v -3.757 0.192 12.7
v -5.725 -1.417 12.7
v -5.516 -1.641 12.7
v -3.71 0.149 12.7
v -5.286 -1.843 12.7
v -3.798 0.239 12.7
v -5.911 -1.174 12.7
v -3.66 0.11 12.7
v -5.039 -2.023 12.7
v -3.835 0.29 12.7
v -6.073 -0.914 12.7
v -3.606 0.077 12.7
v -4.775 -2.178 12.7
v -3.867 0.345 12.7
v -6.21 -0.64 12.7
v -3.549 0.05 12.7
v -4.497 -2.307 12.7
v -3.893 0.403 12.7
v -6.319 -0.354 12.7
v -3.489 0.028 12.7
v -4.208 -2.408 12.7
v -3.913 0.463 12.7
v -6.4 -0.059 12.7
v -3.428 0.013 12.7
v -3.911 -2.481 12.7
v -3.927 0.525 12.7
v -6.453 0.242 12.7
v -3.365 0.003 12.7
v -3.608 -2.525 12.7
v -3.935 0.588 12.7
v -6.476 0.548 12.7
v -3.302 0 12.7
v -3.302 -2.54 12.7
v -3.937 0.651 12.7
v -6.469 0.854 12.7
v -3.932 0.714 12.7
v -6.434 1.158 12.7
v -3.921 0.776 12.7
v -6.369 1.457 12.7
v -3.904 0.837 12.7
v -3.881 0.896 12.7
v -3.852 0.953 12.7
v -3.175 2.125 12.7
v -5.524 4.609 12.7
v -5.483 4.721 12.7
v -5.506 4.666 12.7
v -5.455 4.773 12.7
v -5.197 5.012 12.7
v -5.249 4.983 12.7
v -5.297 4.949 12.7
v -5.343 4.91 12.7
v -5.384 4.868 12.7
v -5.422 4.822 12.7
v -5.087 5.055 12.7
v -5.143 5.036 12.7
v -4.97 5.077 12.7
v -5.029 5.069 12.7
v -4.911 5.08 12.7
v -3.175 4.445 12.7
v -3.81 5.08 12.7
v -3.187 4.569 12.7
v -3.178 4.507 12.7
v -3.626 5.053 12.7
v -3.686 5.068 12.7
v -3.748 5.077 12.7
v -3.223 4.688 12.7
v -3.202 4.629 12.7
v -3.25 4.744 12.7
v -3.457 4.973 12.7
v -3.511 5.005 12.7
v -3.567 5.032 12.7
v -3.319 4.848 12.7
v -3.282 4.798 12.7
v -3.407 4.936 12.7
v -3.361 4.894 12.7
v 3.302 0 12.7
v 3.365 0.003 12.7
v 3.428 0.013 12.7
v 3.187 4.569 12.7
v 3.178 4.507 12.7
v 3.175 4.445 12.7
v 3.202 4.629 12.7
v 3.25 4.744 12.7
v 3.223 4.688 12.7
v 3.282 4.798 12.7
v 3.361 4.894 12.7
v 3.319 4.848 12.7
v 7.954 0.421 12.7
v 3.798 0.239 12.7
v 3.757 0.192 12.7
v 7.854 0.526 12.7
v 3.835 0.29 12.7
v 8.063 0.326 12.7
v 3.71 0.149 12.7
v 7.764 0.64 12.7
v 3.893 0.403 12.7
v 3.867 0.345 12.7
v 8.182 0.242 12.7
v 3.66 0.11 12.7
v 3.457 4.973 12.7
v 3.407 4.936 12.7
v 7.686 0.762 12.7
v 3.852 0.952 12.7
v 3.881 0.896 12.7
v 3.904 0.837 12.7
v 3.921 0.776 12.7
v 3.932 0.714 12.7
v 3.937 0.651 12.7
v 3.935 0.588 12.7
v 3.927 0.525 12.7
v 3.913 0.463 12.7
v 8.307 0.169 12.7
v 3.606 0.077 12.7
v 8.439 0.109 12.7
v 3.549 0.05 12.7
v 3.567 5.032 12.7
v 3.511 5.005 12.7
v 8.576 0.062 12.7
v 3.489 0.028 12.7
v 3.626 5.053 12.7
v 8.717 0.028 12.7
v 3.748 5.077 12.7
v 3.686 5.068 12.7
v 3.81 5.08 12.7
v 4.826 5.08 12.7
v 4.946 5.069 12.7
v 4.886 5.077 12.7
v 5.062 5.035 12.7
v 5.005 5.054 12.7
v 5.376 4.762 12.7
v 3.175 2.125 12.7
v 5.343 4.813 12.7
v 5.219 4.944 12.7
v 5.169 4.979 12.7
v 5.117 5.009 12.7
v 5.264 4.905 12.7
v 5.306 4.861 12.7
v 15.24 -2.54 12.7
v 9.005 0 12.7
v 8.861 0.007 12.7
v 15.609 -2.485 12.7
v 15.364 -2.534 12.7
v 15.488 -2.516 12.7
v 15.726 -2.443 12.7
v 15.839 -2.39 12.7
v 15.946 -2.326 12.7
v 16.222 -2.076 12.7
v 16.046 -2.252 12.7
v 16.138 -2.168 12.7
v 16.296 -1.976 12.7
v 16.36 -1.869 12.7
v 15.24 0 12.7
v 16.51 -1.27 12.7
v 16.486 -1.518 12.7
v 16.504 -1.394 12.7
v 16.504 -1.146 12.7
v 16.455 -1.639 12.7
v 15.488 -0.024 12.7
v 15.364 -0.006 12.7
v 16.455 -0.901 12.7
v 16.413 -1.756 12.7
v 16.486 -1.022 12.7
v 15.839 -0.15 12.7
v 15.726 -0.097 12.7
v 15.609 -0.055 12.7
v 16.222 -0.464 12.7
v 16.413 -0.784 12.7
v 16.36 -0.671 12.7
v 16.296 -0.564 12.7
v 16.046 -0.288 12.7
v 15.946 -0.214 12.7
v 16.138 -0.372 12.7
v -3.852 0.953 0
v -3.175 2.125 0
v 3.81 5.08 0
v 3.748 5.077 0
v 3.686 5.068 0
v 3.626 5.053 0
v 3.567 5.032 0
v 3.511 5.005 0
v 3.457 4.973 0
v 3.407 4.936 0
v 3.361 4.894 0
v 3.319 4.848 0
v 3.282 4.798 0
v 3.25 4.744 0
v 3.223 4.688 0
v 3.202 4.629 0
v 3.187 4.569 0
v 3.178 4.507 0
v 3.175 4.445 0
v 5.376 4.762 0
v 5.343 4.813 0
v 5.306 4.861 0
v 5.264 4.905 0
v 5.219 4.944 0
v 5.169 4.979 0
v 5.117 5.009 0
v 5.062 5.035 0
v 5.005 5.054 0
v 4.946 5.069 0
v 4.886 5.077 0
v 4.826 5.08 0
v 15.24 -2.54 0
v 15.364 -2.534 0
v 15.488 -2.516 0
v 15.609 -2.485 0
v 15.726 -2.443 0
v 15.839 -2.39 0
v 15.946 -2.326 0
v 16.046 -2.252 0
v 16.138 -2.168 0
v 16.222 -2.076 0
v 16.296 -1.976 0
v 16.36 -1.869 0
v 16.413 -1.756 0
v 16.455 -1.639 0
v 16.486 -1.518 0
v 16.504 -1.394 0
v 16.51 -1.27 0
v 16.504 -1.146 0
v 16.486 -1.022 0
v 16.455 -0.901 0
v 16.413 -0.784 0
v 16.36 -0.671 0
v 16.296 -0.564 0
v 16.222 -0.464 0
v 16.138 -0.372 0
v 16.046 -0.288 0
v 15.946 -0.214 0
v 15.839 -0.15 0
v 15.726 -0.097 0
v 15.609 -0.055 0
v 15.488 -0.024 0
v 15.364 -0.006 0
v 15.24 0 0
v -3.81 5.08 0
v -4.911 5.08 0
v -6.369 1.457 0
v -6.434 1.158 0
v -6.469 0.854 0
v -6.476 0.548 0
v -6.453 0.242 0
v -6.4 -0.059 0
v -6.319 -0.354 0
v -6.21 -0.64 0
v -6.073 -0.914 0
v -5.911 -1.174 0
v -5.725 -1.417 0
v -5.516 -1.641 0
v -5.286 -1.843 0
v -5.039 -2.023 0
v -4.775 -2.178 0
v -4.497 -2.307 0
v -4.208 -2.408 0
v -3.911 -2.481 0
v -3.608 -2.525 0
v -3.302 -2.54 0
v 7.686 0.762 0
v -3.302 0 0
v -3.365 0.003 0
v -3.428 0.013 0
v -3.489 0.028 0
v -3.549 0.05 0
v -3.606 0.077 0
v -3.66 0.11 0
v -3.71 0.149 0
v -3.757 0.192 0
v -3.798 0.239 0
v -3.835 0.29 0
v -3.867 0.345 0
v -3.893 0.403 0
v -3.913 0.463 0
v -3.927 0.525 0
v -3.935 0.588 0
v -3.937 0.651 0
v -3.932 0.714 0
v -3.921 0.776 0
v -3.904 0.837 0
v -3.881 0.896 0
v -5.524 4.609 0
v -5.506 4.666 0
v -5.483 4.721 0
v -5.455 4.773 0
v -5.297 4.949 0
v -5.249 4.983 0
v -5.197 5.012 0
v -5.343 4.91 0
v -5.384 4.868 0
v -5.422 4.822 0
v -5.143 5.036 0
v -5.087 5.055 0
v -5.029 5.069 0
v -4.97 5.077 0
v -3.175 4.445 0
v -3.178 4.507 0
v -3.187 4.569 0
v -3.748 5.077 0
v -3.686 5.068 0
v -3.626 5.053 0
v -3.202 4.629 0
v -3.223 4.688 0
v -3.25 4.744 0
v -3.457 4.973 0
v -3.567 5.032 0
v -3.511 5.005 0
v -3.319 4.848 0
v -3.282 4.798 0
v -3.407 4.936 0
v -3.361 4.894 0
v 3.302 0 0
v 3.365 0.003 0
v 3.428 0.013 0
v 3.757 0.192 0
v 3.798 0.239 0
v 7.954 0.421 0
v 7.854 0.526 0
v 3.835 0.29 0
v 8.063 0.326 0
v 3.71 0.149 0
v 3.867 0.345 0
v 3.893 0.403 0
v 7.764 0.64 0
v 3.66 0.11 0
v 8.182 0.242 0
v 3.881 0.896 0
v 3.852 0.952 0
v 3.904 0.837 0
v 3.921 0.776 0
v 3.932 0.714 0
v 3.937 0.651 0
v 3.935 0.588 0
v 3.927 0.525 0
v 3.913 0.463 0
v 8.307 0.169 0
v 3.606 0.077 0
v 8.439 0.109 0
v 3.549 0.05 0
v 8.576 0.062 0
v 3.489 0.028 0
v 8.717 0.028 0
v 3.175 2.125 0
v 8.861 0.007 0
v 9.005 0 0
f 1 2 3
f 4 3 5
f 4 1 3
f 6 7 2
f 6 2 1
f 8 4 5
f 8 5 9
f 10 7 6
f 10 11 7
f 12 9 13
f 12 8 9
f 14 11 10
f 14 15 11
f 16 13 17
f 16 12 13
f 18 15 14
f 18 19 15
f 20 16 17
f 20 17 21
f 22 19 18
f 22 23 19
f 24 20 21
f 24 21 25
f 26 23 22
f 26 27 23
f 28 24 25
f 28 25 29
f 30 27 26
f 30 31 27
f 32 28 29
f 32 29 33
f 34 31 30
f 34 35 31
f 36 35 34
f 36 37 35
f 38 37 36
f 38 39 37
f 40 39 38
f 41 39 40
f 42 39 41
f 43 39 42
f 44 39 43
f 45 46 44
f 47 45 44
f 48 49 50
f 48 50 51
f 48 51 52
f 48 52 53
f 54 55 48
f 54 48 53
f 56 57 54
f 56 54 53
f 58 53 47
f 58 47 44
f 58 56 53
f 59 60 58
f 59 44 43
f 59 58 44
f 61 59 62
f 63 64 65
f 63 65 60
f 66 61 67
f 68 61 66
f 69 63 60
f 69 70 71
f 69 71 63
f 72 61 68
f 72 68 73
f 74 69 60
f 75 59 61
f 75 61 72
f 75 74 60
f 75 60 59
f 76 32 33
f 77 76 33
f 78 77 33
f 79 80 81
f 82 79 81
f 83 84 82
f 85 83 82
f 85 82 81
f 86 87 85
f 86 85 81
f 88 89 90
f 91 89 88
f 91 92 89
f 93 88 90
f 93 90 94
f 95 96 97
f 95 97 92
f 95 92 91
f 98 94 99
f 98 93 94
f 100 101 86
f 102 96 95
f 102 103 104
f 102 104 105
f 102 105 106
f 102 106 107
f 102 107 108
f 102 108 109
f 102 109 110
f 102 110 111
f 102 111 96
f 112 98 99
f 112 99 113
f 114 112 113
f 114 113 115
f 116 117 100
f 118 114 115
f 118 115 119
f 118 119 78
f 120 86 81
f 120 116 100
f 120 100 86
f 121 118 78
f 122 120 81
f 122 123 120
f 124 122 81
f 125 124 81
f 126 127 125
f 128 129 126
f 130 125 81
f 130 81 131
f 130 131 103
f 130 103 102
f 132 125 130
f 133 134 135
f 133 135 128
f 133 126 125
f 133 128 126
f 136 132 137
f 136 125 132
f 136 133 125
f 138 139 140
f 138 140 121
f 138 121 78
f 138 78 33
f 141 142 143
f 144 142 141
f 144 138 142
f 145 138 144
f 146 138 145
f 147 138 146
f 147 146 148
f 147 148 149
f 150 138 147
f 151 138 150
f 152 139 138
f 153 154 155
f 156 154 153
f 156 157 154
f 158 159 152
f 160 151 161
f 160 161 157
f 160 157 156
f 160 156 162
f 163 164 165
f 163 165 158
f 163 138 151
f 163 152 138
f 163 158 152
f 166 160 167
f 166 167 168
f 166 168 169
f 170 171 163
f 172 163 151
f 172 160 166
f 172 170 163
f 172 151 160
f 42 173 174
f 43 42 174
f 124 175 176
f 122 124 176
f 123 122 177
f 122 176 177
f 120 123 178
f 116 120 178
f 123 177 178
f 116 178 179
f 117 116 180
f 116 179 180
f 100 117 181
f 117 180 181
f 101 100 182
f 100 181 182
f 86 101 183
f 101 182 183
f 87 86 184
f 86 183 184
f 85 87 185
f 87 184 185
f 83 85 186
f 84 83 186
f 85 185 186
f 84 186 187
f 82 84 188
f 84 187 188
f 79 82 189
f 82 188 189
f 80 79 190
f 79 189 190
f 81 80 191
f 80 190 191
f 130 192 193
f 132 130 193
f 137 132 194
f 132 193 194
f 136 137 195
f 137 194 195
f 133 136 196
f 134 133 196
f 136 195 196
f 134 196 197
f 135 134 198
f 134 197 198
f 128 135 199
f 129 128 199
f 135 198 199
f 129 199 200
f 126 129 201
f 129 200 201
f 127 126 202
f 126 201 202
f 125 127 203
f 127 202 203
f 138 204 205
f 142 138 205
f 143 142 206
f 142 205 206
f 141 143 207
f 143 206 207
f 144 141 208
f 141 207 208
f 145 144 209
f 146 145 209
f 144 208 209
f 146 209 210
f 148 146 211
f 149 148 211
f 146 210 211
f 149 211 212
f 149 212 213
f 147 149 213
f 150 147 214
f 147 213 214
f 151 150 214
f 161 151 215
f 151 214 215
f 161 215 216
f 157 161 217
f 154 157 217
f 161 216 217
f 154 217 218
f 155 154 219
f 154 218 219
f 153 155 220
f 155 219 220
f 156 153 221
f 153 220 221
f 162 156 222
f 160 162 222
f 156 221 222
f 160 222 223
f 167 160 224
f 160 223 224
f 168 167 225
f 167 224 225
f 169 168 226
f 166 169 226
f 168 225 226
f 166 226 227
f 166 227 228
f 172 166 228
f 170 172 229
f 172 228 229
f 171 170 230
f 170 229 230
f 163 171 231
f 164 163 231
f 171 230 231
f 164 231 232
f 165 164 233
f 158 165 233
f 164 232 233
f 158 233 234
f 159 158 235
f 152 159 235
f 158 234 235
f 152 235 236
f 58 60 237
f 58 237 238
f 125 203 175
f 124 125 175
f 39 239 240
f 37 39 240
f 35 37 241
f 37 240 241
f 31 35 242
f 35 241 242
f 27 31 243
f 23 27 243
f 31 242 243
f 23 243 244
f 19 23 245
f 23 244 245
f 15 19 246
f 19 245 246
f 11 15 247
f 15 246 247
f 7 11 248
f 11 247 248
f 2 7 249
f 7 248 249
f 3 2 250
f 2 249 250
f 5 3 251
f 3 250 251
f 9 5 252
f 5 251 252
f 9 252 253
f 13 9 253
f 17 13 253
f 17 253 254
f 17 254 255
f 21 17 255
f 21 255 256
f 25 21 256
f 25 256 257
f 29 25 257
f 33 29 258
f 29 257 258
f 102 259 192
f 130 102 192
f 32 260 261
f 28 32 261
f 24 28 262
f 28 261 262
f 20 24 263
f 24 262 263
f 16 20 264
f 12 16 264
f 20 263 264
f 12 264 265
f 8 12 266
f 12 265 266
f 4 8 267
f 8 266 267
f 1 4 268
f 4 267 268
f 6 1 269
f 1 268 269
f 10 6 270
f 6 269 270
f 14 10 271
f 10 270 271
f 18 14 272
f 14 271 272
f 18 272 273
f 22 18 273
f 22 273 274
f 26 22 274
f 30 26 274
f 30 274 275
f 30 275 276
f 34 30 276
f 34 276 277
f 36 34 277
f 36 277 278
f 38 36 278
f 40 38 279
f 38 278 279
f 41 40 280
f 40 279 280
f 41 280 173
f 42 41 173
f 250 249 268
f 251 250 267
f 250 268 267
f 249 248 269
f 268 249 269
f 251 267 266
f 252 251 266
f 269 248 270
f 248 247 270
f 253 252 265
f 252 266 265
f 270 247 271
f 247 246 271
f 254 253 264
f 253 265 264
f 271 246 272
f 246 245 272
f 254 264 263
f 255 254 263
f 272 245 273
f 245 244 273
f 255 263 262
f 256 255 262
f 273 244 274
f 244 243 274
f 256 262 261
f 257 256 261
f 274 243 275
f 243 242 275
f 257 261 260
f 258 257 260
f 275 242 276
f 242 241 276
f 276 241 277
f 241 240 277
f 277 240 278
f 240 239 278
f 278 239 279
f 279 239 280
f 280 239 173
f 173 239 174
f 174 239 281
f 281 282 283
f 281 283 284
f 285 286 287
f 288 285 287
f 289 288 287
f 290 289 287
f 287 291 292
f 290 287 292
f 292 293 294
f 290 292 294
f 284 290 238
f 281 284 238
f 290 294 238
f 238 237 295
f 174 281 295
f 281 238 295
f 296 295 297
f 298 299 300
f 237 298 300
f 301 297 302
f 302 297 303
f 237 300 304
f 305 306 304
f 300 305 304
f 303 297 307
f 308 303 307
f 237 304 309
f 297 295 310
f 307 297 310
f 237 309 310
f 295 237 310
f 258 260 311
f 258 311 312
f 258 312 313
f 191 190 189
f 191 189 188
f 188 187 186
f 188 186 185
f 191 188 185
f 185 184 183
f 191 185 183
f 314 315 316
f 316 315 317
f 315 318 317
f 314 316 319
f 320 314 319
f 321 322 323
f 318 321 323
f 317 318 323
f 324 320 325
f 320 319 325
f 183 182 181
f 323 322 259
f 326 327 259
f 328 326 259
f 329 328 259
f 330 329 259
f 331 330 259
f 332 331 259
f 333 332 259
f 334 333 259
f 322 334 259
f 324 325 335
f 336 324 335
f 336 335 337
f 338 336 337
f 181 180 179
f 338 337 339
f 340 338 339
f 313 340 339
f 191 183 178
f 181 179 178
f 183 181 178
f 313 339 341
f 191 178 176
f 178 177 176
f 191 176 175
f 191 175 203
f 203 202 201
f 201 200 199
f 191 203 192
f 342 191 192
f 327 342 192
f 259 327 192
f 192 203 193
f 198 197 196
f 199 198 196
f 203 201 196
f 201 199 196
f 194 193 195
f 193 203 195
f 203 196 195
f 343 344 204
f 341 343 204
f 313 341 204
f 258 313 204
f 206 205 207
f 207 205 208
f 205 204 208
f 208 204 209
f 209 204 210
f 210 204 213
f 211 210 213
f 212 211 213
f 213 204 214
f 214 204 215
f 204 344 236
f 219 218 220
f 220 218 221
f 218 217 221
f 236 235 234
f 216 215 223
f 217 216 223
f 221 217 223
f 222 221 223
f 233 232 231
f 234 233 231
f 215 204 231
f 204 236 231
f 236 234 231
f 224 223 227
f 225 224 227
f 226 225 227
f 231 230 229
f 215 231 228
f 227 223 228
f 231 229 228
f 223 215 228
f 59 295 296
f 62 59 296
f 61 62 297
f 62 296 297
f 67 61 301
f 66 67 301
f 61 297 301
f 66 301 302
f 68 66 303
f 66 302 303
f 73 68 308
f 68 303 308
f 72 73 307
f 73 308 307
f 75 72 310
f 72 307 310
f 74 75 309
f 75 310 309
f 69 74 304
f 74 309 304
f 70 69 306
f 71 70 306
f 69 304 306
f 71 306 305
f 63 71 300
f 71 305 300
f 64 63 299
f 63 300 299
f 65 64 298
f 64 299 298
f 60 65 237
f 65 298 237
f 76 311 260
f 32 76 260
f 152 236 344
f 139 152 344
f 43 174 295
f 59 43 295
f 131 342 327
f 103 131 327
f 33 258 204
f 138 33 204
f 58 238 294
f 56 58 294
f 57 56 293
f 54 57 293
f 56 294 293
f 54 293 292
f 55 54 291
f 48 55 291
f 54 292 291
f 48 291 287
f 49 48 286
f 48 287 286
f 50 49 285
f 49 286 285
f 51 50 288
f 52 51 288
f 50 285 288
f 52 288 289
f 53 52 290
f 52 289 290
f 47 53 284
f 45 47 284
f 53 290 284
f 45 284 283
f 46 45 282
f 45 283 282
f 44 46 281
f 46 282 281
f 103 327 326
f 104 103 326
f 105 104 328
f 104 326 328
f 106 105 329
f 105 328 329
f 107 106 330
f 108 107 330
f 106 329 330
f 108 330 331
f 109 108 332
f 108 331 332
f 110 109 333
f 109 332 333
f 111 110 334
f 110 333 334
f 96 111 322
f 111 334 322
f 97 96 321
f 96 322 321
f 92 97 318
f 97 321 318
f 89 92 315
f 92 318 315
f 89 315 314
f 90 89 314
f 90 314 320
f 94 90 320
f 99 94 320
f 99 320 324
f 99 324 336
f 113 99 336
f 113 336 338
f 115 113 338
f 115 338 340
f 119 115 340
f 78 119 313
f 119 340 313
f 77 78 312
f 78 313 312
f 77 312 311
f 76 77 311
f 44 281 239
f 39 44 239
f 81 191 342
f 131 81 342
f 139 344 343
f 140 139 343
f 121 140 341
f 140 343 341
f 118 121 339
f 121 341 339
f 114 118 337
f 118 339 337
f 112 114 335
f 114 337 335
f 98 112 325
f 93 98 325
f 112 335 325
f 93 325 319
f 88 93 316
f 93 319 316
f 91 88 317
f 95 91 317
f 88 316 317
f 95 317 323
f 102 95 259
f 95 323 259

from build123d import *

# Parameters (mm, degrees)
F1_DEPTH = 12.7


with BuildPart() as f1:
    # F0 (on Top) → F1 (new body)
    with BuildSketch(Plane.XY):
        with BuildLine():
            Line((3.302, 0), (-3.302, 0))
            ThreePointArc((-3.302, 0), (-3.851926, 0.3175), (-3.851926, 0.9525))
            Line((-3.851926, 0.9525), (-3.175, 2.12497))
            Line((-3.175, 2.12497), (-3.175, 4.445))
            ThreePointArc((-3.175, 4.445), (-3.360987, 4.894013), (-3.81, 5.08))
            Line((-3.81, 5.08), (-4.910715, 5.08))
            ThreePointArc((-4.910715, 5.08), (-5.297279, 4.948779), (-5.524078, 4.60935))
            Line((-5.524078, 4.60935), (-6.368814, 1.45675))
            ThreePointArc((-6.368814, 1.45675), (-5.820897, -1.297818), (-3.302, -2.54))
            Line((-3.302, -2.54), (15.24, -2.54))
            ThreePointArc((15.24, -2.54), (16.51, -1.27), (15.24, 0))
            Line((15.24, 0), (9.005439, 0))
            ThreePointArc((9.005439, 0), (8.243439, 0.204177), (7.685616, 0.762))
            Line((7.685616, 0.762), (5.375926, 4.7625))
            ThreePointArc((5.375926, 4.7625), (5.1435, 4.994926), (4.826, 5.08))
            Line((4.826, 5.08), (3.81, 5.08))
            ThreePointArc((3.81, 5.08), (3.360987, 4.894013), (3.175, 4.445))
            Line((3.175, 4.445), (3.175, 2.12497))
            Line((3.175, 2.12497), (3.851926, 0.9525))
            ThreePointArc((3.851926, 0.9525), (3.851926, 0.3175), (3.302, 0))
        make_face()
    extrude(amount=F1_DEPTH)


solid = f1.part
